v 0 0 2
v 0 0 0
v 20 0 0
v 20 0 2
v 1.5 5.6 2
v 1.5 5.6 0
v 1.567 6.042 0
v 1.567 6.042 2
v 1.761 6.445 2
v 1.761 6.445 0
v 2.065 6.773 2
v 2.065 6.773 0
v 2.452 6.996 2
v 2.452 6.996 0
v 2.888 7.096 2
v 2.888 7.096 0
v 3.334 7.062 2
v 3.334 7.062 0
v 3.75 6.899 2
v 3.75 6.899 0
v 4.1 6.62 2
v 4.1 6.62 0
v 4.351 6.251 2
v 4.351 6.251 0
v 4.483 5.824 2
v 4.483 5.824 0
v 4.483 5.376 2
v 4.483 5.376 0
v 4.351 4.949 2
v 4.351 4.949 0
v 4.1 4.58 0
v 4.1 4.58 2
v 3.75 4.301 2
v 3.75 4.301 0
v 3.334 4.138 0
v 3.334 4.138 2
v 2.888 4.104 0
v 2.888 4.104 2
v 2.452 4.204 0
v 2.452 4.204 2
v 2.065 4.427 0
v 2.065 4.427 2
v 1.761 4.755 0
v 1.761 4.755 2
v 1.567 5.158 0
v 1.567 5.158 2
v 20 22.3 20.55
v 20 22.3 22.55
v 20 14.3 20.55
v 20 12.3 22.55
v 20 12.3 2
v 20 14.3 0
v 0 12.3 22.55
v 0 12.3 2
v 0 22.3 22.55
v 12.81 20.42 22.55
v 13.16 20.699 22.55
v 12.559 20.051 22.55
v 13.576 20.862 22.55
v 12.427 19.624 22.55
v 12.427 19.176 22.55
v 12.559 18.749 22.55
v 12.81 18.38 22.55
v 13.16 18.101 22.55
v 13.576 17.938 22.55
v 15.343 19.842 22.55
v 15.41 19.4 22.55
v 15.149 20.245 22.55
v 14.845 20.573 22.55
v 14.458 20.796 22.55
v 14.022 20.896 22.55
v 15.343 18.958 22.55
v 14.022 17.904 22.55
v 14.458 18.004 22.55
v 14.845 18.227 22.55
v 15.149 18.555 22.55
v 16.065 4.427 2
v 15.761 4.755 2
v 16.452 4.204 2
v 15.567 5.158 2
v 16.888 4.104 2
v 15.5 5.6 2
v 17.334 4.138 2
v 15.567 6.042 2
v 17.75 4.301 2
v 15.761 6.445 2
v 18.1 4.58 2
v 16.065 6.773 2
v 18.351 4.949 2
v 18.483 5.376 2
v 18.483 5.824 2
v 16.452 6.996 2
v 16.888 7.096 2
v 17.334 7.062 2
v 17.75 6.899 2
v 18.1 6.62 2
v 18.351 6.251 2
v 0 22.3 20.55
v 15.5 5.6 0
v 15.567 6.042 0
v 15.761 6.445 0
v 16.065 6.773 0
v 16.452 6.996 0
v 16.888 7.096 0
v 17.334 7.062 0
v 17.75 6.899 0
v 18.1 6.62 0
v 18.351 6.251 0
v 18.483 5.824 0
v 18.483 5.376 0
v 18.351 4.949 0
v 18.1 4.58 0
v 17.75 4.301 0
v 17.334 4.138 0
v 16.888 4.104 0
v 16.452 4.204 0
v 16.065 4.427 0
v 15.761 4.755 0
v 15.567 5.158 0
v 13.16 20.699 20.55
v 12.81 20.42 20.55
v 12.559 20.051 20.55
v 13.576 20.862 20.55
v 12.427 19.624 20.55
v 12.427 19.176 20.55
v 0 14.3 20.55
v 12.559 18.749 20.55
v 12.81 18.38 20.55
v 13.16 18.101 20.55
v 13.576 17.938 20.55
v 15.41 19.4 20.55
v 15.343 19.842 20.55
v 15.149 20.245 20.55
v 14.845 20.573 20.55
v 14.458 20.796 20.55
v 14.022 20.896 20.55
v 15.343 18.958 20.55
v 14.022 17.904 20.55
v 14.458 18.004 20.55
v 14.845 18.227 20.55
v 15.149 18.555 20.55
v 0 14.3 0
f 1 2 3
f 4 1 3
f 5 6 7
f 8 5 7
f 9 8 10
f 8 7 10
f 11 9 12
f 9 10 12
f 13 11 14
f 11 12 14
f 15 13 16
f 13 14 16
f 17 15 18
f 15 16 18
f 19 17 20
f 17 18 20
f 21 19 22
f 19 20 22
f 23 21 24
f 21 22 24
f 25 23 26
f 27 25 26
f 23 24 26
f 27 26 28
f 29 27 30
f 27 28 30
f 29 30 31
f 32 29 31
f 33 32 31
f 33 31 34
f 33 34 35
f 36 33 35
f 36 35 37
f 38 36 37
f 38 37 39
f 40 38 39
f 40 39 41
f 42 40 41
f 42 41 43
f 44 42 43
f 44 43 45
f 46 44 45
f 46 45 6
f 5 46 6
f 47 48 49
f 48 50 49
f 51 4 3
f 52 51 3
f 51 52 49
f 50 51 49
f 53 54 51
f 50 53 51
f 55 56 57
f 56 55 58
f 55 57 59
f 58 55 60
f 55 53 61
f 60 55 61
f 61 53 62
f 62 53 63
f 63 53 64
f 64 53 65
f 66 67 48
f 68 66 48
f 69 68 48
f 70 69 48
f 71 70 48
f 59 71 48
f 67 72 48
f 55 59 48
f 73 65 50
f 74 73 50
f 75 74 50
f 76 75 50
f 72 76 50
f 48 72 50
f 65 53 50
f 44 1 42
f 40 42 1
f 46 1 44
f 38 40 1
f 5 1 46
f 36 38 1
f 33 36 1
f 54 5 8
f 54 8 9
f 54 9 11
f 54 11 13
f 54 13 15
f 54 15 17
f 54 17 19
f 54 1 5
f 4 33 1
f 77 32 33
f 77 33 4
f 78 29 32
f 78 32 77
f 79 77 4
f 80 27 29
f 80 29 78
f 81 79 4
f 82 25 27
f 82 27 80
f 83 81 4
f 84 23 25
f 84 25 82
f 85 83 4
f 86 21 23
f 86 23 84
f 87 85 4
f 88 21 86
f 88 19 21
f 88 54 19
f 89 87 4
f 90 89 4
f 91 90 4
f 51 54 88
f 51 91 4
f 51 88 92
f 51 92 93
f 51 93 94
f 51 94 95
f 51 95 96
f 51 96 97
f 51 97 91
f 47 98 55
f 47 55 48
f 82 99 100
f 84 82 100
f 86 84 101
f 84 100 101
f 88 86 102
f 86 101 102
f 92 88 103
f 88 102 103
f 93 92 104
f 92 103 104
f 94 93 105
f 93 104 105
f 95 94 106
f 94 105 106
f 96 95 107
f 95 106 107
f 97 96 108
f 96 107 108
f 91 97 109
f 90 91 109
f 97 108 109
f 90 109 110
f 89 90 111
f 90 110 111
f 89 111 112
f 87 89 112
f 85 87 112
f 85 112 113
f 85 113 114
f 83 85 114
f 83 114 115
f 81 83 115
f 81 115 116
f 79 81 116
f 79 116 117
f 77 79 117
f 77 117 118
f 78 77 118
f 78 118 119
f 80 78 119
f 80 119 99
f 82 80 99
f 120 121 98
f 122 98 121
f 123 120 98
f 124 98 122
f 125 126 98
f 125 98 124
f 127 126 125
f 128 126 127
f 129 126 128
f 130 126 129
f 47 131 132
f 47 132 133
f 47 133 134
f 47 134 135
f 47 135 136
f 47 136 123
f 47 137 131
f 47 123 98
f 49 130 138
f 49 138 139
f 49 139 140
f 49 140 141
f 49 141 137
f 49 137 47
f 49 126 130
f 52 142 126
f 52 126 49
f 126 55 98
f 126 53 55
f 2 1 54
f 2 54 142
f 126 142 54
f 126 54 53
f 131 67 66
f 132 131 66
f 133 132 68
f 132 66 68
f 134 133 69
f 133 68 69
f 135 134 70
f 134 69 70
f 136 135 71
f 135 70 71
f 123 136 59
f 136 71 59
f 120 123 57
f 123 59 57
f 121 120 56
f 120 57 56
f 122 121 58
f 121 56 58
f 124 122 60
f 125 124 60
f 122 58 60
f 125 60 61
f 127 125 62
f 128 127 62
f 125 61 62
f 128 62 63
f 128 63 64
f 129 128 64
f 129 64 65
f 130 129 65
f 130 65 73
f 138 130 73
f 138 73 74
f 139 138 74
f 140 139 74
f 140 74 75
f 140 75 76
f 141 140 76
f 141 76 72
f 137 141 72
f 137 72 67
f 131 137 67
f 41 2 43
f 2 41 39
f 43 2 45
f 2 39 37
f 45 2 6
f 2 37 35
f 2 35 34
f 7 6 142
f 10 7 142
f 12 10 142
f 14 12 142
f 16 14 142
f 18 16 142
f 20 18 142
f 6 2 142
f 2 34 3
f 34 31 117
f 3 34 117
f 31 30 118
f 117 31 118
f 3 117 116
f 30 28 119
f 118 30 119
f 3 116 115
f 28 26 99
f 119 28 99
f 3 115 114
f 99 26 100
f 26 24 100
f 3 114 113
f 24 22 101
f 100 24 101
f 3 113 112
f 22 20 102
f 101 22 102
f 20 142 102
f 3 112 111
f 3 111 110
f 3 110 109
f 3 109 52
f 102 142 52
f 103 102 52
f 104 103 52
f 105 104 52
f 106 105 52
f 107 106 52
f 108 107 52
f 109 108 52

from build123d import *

# Parameters (mm, degrees)
ESQUISSE1_W             = 20
ESQUISSE1_H             = 14.3
BOSS_EXTRU_1_DEPTH      = 2
ESQUISSE2_W             = 20
ESQUISSE2_H             = 2
BOSS_EXTRU_2_DEPTH      = 20.55
ESQUISSE3_W             = 20
ESQUISSE3_H             = 2
BOSS_EXTRU_3_DEPTH      = 8
ESQUISSE4_R             = 1.5
ENL_V_MAT_EXTRU_2_DEPTH = 8
ESQUISSE5_R             = 1.5
ENL_V_MAT_EXTRU_3_DEPTH = 8


with BuildPart() as part:
    # Esquisse1 → Boss.-Extru.1 (new body)
    with BuildSketch(Plane.XY):
        with Locations((10, 7.15)):
            Rectangle(ESQUISSE1_W, ESQUISSE1_H)
    extrude(amount=BOSS_EXTRU_1_DEPTH)

    # Esquisse2 → Boss.-Extru.2 (add)
    with BuildSketch(Plane.XY.offset(2)):
        with Locations((10, 13.3)):
            Rectangle(ESQUISSE2_W, ESQUISSE2_H)
    extrude(amount=BOSS_EXTRU_2_DEPTH)

    # Esquisse3 → Boss.-Extru.3 (add)
    with BuildSketch(Plane(origin=(0, 14.3, 0), x_dir=(1, 0, 0), z_dir=(0, 1, 0))):
        with Locations((10, -21.55)):
            Rectangle(ESQUISSE3_W, ESQUISSE3_H)
    extrude(amount=BOSS_EXTRU_3_DEPTH)

    # Esquisse4 → Enlèv. mat.-Extru.2 (cut)
    with BuildSketch(Plane(origin=(0, 0, 0), x_dir=(-1, 0, 0), z_dir=(0, 0, -1))):
        with Locations((-17, 5.6)):
            Circle(ESQUISSE4_R)
        with Locations((-3, 5.6)):
            Circle(ESQUISSE4_R)
    extrude(amount=-ENL_V_MAT_EXTRU_2_DEPTH, mode=Mode.SUBTRACT)

    # Esquisse5 → Enlèv. mat.-Extru.3 (cut)
    with BuildSketch(Plane.XY.offset(22.55)):
        with Locations((13.91, 19.4)):
            Circle(ESQUISSE5_R)
    extrude(amount=-ENL_V_MAT_EXTRU_3_DEPTH, mode=Mode.SUBTRACT)


solid = part.part
